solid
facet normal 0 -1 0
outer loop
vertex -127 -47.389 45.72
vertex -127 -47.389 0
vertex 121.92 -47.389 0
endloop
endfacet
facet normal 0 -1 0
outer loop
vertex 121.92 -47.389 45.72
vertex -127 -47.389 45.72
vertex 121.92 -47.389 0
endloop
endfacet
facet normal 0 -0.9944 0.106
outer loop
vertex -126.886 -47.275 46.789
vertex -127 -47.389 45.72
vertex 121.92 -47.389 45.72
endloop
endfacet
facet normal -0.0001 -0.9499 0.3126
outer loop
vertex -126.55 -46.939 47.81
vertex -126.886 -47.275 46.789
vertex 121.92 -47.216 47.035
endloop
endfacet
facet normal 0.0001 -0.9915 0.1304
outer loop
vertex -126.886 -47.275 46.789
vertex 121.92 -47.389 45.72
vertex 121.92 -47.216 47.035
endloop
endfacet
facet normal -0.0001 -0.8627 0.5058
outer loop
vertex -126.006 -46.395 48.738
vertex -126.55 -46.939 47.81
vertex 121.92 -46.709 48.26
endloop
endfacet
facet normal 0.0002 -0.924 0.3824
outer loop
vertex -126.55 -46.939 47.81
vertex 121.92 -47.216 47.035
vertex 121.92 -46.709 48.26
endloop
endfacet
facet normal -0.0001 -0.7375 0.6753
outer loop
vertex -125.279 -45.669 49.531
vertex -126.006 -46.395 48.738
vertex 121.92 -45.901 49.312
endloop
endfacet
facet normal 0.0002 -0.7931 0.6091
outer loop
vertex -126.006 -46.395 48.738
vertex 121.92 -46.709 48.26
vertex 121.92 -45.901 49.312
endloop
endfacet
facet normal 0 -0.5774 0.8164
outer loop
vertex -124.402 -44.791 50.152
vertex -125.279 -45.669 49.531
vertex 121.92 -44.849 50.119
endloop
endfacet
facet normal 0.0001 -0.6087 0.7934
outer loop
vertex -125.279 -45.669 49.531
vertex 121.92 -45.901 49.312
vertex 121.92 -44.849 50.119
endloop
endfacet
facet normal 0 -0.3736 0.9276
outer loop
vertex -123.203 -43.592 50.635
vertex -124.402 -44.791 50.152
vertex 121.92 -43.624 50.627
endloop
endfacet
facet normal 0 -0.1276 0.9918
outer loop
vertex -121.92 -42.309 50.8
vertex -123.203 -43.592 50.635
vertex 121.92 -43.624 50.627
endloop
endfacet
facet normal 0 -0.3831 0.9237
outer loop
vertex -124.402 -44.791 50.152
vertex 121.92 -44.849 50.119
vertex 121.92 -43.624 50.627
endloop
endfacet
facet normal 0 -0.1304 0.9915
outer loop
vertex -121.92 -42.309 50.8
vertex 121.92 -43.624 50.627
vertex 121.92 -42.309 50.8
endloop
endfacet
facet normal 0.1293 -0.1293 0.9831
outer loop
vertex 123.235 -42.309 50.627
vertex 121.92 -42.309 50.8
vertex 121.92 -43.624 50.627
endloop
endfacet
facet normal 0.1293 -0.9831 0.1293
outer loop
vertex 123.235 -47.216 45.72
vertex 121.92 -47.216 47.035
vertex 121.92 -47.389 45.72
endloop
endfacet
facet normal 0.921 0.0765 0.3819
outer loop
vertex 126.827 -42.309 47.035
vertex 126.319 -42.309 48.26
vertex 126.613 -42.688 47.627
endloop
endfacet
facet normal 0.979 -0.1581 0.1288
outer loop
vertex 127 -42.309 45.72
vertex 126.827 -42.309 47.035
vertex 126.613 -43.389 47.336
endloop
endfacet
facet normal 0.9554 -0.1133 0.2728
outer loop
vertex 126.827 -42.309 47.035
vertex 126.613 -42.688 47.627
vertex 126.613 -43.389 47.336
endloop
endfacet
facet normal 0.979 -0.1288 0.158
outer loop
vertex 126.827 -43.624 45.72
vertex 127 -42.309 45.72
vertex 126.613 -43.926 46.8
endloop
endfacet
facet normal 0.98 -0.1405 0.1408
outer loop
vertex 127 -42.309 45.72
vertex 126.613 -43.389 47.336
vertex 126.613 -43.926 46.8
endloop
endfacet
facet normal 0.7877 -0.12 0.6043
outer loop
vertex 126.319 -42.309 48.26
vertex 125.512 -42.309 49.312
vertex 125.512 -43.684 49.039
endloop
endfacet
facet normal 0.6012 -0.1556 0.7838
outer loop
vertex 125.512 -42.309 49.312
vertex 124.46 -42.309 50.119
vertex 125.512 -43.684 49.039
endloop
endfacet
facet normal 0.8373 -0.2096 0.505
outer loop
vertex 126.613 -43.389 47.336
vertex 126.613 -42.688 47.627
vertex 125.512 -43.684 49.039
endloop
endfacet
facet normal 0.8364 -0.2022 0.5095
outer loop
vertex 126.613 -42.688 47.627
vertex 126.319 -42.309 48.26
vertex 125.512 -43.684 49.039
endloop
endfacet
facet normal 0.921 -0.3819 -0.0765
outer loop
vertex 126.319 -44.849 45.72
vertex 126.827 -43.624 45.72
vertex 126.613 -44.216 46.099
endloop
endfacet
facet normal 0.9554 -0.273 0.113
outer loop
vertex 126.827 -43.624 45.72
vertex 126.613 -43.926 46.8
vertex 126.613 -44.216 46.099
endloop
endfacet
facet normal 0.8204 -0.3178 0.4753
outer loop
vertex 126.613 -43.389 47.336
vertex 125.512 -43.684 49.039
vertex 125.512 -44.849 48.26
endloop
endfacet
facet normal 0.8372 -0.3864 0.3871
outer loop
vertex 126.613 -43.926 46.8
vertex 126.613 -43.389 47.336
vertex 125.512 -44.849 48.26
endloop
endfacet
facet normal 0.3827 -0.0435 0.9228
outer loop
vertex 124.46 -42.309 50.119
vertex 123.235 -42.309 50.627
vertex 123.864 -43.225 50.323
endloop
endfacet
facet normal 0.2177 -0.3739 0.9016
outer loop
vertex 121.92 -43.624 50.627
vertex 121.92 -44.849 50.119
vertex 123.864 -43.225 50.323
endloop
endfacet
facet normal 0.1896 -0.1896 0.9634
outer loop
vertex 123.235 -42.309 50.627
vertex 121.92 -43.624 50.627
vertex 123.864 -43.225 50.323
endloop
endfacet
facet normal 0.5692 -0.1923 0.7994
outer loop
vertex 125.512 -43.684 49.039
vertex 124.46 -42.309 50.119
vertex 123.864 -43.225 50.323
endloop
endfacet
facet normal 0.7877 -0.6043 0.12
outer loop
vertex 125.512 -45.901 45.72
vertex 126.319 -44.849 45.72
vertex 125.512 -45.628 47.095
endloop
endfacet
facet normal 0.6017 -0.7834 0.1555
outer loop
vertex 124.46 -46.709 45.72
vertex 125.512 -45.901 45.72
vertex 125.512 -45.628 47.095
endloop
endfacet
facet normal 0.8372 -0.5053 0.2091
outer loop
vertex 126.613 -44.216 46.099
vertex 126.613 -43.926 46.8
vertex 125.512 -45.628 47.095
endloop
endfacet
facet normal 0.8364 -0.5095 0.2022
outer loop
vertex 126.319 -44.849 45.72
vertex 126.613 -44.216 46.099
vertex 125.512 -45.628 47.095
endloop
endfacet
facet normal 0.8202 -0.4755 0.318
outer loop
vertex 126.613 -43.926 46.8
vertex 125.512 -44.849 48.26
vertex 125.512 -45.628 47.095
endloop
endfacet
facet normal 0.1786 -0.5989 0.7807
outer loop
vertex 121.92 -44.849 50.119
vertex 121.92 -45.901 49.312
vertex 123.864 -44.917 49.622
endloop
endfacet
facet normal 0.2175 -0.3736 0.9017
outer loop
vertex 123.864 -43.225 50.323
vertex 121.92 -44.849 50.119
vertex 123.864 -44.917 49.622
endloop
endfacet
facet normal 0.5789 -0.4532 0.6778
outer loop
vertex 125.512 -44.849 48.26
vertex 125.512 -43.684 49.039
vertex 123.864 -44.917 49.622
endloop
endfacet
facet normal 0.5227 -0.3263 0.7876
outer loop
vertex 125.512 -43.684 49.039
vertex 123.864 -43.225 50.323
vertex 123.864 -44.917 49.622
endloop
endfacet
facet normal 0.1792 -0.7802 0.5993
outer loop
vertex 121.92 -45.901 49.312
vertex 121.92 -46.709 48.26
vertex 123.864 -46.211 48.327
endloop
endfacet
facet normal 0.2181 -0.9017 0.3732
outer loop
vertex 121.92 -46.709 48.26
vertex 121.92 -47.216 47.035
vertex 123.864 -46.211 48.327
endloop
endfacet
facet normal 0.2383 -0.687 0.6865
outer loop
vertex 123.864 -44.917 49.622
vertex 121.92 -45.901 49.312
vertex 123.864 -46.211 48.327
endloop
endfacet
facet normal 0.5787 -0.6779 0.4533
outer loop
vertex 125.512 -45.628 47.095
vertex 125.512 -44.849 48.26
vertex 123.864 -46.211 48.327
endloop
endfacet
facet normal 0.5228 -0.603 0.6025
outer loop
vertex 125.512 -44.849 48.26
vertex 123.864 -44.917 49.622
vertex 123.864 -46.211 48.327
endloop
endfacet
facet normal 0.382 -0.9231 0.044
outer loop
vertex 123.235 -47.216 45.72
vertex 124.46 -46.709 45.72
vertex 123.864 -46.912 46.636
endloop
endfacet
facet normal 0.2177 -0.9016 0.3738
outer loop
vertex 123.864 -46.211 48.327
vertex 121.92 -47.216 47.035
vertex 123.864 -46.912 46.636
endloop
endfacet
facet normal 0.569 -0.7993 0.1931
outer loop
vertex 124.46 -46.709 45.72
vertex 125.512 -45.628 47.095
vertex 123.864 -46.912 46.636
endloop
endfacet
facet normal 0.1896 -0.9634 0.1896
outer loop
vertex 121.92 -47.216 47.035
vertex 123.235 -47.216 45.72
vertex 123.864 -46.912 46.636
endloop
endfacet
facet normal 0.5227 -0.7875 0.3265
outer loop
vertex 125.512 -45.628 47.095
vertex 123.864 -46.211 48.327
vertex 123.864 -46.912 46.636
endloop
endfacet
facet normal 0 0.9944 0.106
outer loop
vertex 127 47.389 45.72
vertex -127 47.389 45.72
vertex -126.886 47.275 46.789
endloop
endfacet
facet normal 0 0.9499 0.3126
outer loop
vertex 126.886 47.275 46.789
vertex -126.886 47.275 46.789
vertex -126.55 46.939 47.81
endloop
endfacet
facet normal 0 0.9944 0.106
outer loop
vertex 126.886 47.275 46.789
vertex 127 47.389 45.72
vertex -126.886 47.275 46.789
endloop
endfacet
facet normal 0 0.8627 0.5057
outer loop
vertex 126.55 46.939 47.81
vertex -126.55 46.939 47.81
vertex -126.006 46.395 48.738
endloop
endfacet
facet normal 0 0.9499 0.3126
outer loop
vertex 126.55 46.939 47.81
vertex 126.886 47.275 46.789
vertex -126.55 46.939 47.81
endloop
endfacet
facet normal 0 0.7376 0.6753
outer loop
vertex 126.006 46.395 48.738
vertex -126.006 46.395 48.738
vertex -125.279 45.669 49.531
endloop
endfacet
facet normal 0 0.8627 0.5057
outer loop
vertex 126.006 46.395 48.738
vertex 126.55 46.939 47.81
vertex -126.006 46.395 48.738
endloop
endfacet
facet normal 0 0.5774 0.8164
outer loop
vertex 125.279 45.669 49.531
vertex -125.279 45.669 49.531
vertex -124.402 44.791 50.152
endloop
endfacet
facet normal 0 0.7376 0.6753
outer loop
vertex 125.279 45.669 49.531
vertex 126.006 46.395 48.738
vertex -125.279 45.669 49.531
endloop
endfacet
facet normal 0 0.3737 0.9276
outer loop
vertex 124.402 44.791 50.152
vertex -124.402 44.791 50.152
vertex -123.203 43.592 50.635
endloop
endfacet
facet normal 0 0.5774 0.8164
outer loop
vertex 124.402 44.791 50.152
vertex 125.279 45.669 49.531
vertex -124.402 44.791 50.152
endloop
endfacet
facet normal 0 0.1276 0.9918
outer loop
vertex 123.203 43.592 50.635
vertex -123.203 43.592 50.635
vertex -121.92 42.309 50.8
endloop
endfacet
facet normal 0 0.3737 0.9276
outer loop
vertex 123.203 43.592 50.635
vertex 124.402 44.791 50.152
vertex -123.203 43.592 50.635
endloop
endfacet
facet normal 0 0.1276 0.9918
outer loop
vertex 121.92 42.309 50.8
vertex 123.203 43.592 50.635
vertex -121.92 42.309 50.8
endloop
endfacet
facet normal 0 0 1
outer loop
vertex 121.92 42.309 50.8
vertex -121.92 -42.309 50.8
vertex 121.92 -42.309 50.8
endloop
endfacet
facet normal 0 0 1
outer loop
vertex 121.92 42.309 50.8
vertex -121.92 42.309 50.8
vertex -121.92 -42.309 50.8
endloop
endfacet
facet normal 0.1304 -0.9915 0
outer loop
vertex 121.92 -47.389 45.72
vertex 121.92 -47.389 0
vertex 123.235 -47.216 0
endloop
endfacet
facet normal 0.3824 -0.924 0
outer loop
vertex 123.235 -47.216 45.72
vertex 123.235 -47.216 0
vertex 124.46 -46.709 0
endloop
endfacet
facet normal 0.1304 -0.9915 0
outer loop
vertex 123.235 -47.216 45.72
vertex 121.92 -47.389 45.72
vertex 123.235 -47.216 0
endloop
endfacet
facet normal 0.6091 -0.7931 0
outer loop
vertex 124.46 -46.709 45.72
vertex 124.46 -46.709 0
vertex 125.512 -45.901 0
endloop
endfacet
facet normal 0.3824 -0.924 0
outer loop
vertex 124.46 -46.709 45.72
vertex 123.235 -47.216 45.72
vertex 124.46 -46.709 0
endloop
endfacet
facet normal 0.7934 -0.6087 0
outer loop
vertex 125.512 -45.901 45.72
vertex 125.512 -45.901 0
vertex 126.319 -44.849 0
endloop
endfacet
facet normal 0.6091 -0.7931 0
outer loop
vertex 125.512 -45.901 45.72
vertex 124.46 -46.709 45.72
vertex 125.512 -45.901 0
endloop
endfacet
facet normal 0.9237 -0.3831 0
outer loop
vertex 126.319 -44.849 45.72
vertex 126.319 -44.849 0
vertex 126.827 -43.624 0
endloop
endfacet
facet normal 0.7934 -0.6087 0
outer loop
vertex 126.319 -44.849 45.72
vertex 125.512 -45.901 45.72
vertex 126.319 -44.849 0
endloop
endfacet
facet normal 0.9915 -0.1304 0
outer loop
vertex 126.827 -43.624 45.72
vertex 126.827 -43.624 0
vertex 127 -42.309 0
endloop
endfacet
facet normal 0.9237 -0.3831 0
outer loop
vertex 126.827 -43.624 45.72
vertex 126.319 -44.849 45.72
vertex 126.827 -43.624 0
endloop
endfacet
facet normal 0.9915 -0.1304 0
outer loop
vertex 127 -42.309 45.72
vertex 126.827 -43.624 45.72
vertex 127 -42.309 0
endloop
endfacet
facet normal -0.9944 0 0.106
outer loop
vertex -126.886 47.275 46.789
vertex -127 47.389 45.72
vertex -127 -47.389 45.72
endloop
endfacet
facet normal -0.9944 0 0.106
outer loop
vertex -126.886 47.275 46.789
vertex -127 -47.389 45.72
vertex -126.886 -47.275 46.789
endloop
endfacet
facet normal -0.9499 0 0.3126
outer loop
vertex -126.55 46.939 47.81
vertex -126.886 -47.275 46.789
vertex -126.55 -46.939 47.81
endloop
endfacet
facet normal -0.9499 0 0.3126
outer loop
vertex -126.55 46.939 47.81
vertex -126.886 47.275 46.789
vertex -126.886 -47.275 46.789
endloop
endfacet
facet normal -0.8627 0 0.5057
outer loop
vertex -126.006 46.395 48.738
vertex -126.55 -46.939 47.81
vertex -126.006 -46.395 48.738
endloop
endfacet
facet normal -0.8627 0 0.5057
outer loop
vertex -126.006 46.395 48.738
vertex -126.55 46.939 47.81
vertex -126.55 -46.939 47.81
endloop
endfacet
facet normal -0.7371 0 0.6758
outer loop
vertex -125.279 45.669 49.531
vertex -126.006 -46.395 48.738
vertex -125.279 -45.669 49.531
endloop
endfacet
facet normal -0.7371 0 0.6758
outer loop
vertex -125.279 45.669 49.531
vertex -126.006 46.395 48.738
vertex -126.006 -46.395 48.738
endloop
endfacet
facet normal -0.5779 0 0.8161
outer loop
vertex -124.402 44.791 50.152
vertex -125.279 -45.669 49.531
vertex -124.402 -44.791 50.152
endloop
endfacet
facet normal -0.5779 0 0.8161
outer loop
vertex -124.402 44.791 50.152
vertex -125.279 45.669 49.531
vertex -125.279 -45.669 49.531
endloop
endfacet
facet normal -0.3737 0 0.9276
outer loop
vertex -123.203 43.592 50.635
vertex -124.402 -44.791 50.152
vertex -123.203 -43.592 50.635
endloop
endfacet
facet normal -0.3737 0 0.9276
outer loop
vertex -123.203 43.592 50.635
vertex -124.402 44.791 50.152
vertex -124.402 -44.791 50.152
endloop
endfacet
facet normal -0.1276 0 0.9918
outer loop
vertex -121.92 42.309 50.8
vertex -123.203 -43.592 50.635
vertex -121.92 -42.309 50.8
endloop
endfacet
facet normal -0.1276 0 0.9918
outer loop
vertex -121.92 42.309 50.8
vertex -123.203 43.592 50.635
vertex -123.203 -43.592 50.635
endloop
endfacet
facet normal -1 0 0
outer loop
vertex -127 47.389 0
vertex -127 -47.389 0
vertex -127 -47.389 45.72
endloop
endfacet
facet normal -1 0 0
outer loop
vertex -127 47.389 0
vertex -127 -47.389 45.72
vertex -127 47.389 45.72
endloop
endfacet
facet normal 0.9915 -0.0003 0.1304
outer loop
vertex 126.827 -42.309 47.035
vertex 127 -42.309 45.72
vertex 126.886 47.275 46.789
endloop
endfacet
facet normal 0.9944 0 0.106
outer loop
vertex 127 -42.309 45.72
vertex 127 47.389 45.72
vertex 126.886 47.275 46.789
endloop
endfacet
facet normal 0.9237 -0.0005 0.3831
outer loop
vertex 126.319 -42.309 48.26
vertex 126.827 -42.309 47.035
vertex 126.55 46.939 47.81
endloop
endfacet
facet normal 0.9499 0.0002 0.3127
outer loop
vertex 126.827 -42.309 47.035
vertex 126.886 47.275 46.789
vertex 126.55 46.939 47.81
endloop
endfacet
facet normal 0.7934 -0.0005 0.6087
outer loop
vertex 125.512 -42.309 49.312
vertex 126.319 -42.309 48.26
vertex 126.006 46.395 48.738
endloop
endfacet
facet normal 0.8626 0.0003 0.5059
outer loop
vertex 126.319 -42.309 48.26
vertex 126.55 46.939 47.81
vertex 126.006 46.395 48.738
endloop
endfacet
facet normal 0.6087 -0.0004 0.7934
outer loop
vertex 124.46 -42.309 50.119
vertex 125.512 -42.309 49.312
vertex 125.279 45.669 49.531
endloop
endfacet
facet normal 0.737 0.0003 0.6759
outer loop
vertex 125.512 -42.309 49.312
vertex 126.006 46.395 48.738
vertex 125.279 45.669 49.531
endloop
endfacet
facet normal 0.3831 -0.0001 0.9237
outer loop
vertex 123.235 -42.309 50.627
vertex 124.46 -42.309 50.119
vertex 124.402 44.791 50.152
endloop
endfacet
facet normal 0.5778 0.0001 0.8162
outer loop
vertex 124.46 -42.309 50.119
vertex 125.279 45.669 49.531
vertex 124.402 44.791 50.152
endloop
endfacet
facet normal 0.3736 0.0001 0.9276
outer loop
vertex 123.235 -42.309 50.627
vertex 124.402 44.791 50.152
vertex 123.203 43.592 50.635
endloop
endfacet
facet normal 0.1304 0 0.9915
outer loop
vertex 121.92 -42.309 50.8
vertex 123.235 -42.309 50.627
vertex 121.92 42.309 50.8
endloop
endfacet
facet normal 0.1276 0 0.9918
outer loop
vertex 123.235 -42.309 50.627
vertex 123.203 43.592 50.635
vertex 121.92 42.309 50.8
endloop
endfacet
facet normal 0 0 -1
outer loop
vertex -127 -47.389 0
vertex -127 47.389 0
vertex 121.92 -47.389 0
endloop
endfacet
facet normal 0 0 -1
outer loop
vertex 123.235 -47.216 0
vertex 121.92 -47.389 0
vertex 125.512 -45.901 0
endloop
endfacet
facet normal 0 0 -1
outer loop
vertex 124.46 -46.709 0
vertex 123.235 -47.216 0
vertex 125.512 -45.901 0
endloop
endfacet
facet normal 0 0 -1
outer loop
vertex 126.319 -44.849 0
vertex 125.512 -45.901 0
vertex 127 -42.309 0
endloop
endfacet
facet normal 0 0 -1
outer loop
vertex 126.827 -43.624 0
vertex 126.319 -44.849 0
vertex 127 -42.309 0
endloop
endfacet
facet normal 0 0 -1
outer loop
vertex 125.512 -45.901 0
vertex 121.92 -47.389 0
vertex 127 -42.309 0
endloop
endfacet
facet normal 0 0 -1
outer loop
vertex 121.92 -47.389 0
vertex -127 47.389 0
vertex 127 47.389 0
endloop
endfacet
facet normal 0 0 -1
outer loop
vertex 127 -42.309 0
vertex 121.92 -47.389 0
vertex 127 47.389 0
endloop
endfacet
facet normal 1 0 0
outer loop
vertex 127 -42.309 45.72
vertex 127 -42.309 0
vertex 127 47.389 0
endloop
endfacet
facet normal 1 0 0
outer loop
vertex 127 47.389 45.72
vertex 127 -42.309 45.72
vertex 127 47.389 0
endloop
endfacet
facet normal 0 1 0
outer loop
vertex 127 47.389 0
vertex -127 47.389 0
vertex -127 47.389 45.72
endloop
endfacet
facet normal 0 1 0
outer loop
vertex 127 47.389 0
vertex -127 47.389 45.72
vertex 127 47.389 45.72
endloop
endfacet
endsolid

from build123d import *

# Parameters (mm, degrees)
F0_W     = 254
F0_H     = 94.778198
F1_DEPTH = 50.8
F2_R     = 5.08


with BuildPart() as f1:
    # F0 (on Top) → F1 (new body)
    with BuildSketch(Plane.XY):
        Rectangle(F0_W, F0_H)
    extrude(amount=F1_DEPTH)

    # F2
    f2_edges = [f1.edges().sort_by_distance(p)[0] for p in [
        (0, -47.389099, 50.8),
        (127, 0, 50.8),
        (0, 47.389099, 50.8),
        (-127, 0, 50.8),
        (127, -47.389099, 25.4),
    ]]
    fillet(f2_edges, radius=F2_R)


solid = f1.part
